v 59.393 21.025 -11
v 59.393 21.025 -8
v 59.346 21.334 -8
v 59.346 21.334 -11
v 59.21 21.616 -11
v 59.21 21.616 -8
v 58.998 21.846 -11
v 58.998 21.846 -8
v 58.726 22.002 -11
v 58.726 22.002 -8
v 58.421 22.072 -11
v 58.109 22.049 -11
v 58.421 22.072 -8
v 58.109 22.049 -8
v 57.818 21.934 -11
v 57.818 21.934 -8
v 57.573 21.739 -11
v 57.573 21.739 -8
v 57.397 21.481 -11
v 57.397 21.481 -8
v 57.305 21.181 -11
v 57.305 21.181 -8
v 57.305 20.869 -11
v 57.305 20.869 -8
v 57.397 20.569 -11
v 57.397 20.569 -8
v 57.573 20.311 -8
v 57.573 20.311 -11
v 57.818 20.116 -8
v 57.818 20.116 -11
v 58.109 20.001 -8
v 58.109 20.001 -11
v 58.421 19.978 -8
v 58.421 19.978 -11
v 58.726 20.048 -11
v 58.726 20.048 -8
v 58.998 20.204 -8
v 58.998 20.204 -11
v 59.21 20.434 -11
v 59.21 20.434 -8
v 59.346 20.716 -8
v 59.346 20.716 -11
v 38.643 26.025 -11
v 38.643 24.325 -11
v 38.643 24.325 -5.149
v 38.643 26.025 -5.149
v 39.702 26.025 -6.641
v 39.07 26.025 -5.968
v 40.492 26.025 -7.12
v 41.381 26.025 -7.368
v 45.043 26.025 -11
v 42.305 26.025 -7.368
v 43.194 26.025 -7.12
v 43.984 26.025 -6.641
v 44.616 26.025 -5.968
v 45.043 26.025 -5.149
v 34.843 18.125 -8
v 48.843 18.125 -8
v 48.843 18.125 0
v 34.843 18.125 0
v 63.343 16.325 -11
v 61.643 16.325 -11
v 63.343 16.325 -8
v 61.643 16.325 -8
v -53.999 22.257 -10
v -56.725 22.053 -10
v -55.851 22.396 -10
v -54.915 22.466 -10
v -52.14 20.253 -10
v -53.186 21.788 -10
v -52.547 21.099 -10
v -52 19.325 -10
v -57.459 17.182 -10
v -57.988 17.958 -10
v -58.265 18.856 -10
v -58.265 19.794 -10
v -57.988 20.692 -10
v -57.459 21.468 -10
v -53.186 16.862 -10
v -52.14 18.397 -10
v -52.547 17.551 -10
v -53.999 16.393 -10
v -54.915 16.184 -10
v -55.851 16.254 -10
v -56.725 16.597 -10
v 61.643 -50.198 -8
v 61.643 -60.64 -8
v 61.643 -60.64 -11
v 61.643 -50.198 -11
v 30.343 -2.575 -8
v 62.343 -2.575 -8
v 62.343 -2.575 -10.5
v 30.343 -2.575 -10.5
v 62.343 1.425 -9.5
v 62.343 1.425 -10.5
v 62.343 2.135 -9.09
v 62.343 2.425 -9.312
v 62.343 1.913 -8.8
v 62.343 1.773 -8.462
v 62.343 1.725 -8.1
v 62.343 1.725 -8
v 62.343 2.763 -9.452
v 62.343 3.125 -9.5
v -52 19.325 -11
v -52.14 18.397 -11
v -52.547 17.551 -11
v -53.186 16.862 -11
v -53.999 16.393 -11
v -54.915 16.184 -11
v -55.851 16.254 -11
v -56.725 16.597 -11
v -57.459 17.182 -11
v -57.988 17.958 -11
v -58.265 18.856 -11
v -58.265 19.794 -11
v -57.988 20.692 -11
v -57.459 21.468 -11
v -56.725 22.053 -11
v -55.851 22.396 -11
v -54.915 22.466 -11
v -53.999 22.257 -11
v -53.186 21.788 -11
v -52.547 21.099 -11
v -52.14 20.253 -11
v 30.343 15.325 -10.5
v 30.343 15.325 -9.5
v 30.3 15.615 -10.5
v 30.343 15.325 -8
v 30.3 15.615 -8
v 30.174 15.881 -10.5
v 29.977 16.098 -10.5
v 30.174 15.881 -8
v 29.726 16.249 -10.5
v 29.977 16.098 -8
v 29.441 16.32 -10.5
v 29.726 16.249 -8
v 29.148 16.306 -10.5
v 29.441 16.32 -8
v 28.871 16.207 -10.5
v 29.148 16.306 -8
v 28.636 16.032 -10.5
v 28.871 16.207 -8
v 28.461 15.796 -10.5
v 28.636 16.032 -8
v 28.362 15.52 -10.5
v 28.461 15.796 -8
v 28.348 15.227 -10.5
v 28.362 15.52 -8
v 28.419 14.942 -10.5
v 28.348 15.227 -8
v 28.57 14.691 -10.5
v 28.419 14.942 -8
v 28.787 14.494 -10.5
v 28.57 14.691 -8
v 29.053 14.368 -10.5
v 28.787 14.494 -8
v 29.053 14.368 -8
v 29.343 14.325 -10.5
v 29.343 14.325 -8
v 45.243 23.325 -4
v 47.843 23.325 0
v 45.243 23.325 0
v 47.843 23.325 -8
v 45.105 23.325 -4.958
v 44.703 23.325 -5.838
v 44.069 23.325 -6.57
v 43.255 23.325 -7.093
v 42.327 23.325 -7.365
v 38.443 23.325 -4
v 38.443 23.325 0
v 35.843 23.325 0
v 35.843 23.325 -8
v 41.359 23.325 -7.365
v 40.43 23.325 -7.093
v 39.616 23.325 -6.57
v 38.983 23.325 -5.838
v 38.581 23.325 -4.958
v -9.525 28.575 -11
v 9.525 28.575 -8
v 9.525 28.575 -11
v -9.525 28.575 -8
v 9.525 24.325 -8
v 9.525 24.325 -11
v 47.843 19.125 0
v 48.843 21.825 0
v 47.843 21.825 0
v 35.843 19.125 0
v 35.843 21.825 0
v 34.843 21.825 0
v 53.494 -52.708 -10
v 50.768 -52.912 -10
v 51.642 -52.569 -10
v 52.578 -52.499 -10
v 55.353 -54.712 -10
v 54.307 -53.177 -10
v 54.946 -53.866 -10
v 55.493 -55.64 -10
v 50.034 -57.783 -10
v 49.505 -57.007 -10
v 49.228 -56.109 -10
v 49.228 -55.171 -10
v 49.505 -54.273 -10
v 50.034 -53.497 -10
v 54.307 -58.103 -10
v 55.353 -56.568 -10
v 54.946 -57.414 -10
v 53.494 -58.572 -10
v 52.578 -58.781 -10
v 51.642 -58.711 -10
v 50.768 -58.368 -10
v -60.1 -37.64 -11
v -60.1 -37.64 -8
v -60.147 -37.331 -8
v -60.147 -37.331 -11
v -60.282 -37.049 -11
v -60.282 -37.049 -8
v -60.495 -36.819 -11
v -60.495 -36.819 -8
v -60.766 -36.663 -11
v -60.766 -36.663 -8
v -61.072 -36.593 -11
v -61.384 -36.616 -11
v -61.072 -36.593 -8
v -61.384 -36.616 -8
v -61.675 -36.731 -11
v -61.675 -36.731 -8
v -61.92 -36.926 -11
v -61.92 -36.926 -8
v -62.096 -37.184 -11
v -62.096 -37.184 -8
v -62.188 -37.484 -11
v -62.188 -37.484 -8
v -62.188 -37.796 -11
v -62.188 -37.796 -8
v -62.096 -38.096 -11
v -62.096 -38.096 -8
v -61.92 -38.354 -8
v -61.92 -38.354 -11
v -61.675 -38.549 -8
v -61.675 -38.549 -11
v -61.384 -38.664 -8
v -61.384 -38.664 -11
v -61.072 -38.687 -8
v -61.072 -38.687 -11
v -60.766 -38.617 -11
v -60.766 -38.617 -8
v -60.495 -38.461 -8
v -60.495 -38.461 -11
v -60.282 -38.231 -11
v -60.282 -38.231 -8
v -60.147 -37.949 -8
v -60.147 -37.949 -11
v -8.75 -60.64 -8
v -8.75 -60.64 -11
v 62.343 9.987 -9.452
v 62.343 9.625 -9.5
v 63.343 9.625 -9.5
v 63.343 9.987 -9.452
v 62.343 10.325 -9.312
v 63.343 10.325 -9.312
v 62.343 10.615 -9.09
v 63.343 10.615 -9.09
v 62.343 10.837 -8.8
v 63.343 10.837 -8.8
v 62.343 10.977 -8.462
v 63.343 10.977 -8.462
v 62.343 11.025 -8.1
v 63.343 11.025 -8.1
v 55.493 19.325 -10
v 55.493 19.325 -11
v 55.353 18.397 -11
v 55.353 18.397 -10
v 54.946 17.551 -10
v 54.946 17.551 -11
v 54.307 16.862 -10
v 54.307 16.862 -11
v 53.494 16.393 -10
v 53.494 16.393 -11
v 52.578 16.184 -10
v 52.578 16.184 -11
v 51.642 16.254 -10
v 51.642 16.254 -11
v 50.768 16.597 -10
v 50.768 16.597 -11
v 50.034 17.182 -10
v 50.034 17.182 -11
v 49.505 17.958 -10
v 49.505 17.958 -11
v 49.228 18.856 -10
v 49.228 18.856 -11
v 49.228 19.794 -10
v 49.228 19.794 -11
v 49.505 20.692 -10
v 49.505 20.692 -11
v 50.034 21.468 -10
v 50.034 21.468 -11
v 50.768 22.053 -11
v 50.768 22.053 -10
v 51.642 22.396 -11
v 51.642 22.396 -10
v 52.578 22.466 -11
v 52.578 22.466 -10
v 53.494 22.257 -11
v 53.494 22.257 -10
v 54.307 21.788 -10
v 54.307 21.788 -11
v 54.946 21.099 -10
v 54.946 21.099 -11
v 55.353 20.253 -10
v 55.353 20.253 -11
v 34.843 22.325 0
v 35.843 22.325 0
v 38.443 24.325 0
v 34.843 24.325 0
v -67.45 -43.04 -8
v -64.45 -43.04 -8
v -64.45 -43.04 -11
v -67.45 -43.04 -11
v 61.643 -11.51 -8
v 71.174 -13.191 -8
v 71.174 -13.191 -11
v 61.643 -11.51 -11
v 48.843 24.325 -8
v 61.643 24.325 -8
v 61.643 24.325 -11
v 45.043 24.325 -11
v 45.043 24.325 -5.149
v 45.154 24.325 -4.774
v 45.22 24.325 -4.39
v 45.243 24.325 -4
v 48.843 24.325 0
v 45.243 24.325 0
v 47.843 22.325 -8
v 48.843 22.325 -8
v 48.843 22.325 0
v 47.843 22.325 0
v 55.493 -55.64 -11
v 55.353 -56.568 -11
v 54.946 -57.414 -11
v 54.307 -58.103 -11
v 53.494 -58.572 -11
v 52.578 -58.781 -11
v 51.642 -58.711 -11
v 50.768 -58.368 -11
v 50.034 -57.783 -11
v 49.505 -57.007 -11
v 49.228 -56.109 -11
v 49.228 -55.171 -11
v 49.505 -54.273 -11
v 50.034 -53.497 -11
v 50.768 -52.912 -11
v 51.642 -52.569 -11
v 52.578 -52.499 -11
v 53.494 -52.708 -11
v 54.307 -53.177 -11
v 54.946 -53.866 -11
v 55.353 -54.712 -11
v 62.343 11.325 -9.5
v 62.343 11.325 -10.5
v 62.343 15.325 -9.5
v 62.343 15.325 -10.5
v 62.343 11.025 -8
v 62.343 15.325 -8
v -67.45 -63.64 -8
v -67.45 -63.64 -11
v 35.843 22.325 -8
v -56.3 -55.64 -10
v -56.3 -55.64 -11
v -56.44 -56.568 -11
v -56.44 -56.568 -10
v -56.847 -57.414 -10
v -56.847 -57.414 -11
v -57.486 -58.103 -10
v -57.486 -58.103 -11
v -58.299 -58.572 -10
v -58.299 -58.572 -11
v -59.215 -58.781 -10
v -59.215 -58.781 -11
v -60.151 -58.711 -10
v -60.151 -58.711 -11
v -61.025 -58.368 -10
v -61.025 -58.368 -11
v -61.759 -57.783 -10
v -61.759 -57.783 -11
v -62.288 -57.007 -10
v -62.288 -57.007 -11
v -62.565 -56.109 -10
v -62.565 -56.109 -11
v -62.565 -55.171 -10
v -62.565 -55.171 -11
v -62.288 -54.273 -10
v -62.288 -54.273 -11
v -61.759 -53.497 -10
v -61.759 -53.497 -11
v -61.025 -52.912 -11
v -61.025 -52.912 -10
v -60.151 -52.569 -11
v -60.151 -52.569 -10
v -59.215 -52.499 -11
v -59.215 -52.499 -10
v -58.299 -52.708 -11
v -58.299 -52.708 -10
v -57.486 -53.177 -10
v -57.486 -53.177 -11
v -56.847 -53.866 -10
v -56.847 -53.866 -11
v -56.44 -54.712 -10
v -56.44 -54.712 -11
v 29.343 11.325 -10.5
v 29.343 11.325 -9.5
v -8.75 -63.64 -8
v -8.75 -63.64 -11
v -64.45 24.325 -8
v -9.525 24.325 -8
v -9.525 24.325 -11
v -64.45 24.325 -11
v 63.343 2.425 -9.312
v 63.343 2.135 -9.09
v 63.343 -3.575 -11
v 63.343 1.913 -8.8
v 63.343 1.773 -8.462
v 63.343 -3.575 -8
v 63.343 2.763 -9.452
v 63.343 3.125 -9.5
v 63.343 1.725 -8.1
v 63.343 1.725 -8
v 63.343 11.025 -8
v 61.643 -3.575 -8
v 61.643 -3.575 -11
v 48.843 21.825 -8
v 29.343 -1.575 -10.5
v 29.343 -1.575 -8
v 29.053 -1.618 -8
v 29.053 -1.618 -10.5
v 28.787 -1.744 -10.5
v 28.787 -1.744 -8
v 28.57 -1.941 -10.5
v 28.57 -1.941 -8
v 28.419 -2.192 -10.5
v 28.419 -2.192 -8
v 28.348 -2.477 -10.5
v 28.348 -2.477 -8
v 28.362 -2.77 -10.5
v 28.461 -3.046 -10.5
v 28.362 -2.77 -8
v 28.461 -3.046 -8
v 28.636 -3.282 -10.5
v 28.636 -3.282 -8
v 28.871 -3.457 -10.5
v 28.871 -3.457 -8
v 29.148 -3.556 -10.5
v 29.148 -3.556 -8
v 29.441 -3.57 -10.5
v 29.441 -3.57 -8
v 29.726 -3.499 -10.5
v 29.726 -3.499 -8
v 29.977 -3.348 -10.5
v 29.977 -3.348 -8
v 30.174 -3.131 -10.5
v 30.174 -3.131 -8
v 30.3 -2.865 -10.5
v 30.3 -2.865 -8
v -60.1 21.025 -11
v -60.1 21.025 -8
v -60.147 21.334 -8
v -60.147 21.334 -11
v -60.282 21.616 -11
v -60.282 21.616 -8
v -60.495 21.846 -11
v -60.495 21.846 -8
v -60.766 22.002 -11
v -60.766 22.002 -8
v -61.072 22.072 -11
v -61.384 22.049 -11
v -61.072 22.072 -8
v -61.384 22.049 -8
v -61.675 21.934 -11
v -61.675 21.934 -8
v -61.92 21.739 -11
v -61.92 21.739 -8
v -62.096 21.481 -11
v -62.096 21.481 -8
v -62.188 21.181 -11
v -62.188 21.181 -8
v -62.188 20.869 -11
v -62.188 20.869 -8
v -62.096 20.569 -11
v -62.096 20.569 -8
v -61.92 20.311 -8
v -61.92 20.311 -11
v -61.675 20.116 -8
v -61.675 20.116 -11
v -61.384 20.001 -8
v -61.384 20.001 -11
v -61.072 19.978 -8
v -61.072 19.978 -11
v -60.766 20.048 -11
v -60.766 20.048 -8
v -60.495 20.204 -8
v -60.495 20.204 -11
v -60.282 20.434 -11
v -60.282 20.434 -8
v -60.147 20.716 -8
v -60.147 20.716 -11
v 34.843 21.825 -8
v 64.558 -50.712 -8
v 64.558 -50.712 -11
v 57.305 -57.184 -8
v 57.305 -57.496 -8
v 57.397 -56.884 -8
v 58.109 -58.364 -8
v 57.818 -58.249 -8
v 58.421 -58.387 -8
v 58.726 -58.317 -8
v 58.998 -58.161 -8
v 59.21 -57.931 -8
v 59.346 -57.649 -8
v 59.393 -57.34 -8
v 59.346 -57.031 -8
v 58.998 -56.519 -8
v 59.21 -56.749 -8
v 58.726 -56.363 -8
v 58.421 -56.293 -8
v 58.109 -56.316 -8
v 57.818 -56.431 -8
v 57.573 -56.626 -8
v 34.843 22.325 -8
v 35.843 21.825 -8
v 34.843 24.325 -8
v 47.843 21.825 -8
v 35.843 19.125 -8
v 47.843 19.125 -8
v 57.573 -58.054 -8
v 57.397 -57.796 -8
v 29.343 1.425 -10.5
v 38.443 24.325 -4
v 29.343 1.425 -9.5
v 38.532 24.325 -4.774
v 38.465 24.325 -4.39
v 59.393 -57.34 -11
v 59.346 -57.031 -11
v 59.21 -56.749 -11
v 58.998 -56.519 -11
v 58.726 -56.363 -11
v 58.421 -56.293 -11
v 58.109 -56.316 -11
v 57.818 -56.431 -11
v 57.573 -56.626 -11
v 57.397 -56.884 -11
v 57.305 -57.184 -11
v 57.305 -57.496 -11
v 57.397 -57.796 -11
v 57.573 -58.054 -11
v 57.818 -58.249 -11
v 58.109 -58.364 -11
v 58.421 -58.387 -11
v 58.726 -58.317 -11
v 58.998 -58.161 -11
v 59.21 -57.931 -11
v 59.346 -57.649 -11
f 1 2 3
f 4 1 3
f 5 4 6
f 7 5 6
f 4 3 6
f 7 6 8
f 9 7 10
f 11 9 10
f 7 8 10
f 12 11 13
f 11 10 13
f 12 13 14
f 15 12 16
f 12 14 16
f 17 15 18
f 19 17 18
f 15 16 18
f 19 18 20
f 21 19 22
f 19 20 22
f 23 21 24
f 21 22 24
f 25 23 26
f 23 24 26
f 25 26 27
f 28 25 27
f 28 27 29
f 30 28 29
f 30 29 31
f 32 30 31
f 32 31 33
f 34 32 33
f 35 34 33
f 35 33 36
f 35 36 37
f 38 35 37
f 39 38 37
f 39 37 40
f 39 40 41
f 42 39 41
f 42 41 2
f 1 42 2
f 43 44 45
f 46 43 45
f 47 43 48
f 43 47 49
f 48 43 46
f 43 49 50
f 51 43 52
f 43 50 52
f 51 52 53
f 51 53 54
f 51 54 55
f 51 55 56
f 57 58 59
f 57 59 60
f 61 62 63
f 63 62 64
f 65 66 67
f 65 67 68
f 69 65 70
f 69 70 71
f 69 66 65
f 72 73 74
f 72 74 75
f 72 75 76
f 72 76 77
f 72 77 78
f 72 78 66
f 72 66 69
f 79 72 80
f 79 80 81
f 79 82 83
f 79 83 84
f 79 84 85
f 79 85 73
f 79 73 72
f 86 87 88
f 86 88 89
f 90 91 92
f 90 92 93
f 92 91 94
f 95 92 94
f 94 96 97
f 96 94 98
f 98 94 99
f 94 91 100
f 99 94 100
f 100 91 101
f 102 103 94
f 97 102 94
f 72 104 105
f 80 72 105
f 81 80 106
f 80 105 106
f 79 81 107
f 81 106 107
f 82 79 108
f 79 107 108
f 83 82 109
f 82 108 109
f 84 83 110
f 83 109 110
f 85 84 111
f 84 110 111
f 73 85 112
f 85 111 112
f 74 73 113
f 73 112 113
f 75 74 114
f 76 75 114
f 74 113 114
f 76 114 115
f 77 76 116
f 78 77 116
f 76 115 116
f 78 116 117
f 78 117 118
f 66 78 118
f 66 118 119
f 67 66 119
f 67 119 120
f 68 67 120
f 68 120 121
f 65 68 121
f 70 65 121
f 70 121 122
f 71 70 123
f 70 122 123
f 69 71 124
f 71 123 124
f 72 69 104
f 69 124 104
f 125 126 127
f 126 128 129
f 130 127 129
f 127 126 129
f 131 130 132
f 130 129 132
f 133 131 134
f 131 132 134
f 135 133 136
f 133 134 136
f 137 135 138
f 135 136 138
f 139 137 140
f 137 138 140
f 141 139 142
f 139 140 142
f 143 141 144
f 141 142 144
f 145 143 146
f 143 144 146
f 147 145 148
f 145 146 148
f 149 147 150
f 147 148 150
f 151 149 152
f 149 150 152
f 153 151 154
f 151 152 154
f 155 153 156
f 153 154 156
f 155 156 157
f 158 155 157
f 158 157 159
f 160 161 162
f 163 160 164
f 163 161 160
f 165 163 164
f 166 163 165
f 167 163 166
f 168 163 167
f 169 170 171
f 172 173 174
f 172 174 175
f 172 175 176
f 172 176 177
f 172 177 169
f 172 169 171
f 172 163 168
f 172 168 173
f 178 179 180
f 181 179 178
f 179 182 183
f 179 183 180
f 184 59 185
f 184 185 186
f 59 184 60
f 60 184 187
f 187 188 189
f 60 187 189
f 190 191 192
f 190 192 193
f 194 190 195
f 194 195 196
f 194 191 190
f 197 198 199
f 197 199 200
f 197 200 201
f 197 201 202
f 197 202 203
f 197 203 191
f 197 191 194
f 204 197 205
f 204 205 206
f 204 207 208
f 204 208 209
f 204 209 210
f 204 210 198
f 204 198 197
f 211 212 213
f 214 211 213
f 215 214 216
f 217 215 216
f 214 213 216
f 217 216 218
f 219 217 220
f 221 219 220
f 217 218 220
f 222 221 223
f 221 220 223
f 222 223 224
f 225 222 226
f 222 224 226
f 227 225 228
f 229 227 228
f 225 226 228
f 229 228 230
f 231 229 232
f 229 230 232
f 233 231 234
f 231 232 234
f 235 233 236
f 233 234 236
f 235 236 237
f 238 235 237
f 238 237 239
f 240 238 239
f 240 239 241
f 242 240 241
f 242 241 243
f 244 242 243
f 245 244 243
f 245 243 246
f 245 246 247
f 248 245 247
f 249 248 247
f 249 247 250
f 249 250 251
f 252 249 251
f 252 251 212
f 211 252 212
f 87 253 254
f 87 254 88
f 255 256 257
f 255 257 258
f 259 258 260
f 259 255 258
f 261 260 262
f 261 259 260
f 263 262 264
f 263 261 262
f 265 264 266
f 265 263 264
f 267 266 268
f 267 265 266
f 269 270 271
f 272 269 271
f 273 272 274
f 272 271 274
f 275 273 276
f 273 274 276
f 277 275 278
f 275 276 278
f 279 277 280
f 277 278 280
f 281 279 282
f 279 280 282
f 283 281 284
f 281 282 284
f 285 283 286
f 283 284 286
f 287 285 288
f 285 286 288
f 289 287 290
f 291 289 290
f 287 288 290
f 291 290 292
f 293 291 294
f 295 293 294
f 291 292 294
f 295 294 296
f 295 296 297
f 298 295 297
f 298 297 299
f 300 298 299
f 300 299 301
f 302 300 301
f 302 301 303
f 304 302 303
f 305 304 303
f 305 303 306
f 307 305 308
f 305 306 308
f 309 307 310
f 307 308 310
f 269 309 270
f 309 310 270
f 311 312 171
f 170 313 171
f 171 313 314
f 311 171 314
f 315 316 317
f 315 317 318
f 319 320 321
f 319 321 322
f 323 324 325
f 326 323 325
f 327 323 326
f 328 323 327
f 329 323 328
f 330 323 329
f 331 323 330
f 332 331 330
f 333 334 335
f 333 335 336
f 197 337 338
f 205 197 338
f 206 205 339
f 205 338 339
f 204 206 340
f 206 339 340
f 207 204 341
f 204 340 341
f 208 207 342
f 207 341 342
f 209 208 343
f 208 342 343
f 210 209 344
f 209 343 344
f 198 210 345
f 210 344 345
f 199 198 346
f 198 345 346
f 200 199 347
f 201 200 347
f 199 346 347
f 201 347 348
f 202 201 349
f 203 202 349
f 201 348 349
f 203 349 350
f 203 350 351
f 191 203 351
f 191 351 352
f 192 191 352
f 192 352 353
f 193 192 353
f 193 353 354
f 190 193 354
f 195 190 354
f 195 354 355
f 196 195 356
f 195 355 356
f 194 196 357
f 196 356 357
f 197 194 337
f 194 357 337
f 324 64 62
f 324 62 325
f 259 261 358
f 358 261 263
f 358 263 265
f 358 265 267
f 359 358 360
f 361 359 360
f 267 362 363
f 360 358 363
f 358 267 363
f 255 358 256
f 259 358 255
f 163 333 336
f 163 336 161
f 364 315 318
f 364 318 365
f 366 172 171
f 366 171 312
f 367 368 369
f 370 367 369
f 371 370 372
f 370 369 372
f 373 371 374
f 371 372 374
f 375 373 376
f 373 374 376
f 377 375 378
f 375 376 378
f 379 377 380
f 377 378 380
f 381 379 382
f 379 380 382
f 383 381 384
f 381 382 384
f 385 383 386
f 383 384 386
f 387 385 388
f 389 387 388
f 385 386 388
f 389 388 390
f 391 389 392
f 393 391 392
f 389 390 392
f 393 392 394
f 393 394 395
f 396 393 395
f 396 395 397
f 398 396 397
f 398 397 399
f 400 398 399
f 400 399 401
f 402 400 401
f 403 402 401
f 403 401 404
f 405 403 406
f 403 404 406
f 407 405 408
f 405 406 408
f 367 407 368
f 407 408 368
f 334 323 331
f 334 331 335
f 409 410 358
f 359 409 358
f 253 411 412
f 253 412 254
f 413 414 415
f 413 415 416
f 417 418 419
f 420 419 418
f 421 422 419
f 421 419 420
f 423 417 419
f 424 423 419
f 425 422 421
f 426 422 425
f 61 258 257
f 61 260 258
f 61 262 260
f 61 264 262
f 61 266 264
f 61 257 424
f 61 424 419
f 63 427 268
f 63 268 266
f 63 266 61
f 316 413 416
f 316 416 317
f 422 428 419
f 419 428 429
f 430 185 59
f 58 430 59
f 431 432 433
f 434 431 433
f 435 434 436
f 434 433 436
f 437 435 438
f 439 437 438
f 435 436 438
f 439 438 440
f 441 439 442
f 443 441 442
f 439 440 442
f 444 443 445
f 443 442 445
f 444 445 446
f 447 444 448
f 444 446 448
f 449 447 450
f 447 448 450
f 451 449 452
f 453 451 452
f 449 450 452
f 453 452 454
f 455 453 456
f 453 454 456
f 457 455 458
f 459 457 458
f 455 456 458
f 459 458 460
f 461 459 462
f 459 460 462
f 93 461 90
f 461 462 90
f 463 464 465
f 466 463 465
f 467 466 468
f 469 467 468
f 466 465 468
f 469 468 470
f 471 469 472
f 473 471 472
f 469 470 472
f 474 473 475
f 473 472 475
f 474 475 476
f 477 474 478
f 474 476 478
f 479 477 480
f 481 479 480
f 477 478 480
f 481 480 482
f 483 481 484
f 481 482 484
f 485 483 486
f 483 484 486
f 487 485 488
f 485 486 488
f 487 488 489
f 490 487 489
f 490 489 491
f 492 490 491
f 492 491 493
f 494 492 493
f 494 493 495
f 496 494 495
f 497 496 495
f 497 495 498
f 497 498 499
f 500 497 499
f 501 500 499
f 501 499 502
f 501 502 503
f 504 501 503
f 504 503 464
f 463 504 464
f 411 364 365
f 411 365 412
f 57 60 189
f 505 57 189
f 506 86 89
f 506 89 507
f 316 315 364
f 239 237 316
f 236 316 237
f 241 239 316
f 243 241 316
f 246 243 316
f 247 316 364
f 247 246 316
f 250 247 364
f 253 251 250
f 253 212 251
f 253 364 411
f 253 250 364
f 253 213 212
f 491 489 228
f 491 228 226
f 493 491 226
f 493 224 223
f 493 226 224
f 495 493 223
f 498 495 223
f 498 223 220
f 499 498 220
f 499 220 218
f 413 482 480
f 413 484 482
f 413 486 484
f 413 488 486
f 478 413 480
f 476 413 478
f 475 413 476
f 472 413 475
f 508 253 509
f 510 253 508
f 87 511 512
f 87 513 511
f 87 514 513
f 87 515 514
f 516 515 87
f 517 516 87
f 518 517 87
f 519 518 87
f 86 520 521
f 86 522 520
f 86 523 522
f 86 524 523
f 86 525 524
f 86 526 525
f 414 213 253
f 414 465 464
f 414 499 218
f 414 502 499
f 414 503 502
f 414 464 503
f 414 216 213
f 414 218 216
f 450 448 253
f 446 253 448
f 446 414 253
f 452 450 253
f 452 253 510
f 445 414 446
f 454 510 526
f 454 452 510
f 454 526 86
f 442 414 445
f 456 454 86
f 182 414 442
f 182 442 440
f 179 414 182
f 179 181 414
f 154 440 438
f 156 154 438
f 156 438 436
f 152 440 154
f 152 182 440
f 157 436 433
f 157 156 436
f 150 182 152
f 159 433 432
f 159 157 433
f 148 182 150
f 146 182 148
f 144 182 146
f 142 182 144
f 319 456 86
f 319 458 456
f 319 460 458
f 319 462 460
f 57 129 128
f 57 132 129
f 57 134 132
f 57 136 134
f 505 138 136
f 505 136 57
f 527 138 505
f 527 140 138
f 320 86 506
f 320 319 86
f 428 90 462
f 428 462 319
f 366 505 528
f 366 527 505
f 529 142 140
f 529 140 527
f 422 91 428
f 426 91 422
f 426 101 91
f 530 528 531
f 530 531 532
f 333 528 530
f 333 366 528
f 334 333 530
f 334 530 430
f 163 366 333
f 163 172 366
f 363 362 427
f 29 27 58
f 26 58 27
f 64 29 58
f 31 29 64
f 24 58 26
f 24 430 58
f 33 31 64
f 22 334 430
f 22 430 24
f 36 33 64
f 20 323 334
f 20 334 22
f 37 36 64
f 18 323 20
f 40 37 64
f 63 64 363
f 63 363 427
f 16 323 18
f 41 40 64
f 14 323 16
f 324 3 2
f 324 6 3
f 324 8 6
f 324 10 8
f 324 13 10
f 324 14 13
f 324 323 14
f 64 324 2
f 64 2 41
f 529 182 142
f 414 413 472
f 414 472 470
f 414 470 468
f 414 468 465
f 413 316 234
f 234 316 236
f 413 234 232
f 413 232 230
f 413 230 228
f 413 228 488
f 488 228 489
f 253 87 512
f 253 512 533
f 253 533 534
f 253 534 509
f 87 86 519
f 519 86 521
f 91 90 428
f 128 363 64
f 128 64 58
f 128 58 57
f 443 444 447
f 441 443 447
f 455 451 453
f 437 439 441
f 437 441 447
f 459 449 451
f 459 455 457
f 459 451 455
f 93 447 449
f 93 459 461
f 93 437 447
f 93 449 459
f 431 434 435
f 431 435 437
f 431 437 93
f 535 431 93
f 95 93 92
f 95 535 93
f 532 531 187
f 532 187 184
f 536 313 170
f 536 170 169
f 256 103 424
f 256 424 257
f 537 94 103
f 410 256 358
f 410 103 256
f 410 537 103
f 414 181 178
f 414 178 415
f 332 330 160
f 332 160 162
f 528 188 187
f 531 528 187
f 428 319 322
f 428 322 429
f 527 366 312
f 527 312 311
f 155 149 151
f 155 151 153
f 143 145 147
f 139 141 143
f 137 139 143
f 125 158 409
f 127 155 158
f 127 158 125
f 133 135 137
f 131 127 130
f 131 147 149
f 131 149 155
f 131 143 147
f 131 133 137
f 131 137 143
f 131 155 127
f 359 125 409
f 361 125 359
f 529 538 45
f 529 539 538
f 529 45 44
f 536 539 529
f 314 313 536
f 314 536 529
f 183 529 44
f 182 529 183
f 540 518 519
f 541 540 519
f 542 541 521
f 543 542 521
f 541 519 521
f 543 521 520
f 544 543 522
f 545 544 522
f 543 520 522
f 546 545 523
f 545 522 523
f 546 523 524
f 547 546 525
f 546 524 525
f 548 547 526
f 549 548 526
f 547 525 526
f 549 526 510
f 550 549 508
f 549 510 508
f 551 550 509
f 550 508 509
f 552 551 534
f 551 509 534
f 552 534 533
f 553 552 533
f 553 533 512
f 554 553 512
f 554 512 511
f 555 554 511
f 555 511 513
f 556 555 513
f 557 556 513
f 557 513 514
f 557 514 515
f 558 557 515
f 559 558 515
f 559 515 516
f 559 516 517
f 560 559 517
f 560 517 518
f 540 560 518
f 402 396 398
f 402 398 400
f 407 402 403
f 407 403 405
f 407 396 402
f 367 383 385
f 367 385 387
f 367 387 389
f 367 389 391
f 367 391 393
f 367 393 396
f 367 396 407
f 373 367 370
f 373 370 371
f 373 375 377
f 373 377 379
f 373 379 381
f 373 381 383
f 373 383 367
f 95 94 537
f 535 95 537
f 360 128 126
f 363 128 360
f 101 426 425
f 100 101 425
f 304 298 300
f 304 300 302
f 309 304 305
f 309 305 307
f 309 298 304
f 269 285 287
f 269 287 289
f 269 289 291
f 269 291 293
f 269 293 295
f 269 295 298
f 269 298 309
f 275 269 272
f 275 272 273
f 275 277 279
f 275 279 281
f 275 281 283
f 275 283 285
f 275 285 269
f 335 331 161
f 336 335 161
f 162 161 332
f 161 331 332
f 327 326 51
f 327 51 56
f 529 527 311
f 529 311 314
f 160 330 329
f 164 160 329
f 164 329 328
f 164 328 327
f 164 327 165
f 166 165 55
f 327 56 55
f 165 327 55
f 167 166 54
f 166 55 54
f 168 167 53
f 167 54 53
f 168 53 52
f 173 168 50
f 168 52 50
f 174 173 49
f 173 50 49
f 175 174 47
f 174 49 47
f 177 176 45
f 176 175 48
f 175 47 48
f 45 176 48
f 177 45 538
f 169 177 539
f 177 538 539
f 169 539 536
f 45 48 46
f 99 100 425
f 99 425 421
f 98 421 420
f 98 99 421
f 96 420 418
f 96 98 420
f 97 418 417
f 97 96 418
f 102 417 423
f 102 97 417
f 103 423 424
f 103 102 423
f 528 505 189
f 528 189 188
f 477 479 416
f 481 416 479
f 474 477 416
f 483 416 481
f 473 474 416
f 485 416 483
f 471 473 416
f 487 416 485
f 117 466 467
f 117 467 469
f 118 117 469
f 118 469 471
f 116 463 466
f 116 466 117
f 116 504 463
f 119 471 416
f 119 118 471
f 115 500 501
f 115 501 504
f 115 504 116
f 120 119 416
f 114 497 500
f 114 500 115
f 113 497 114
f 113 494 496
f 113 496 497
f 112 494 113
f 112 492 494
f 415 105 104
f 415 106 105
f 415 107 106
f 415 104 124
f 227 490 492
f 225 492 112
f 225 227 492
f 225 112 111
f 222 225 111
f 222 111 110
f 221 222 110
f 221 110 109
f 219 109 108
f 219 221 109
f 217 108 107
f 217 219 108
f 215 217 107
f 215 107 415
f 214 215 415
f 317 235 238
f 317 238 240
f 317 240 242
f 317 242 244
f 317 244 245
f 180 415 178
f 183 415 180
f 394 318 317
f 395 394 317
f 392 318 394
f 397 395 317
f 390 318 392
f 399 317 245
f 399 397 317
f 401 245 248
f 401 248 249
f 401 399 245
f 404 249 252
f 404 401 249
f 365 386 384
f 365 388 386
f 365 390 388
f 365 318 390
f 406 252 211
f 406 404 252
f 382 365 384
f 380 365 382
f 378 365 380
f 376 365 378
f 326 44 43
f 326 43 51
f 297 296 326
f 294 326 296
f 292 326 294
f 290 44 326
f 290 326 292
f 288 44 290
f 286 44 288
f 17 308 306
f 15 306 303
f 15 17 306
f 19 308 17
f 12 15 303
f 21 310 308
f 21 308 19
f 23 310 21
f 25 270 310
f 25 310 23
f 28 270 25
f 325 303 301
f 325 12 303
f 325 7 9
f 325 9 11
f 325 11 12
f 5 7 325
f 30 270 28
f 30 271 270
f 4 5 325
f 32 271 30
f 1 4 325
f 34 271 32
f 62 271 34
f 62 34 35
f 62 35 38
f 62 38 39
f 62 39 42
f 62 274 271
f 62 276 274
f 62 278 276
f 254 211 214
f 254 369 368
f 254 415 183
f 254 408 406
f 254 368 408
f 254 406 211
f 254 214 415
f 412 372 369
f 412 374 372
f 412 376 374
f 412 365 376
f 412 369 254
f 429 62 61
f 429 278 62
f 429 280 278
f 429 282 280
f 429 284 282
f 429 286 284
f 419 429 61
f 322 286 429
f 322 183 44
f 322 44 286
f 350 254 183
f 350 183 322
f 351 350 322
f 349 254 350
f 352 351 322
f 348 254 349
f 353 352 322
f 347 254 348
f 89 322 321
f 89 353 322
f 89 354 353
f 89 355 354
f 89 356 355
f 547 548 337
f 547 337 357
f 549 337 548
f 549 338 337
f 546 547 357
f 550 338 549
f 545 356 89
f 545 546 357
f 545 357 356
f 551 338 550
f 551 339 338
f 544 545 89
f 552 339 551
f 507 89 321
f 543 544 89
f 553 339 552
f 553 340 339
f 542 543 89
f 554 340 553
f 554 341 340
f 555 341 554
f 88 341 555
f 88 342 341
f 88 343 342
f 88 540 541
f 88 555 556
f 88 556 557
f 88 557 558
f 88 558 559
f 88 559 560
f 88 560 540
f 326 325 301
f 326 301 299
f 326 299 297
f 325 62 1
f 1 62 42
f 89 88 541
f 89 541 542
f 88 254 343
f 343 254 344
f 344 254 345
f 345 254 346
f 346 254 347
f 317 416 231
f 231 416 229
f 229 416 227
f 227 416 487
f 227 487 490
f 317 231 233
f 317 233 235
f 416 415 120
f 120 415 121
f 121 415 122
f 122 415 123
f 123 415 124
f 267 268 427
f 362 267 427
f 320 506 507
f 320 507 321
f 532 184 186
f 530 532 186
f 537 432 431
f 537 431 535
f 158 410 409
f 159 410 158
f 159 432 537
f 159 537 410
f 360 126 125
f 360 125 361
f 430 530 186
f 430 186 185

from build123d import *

# Parameters (mm, degrees)
PAD017_DEPTH    = 3
SKETCH041_R     = 1.05
POCKET007_DEPTH = 3.001
PAD018_DEPTH    = 1.7
SKETCH043_W     = 33
SKETCH043_H     = 17.9
POCKET008_DEPTH = 1.5
POCKET009_DEPTH = 2.5
SKETCH045_W     = 6.4
SKETCH045_H     = 7
PAD019_DEPTH    = 1.7
PAD020_DEPTH    = 8
POCKET010_DEPTH = 6.9
SKETCH048_R     = 3.15
POCKET011_DEPTH = 1


with BuildPart() as part:
    # Sketch040 (on Face97 of Binder002) → Pad017 (new body)
    with BuildSketch(Plane.XY.offset(-8)):
        Polygon((-64.45, 24.325), (-64.45, -43.04), (-67.45, -43.04), (-67.45, -63.64), (-8.75, -63.64), (-8.75, -60.64), (61.6428917544, -60.64), (61.6428917544, -50.1977285884), (64.5583406887, -50.7118008964), (71.1743362578, -13.1906255066), (61.6428917544, -11.5099746756), (61.6428917544, 24.325), (9.525, 24.325), (9.525, 28.575), (-9.525, 28.575), (-9.525, 24.325), align=None)
    extrude(amount=-PAD017_DEPTH)

    # Sketch041 (on Face17 of Pad017) → Pocket007 (cut, through all)
    with BuildSketch(Plane.XY.offset(-8)):
        with Locations((-61.15, 21.025)):
            Circle(SKETCH041_R)
        with Locations((-61.15, -37.64)):
            Circle(SKETCH041_R)
        with Locations((58.3428917544, 21.025)):
            Circle(SKETCH041_R)
        with Locations((58.3428917544, -57.34)):
            Circle(SKETCH041_R)
    extrude(amount=-POCKET007_DEPTH, mode=Mode.SUBTRACT)

    # Sketch042 (on Vertex202 of Binder002) → Pad018 (join)
    with BuildSketch(Plane(origin=(61.6428917544, 16.525, -11), x_dir=(0, 1, 0), z_dir=(1, 0, 0))):
        with BuildLine():
            Line((-0.2, 0), (-0.2, 3))
            Line((-0.2, 3), (-5.5, 3))
            Line((-5.5, 2.9), (-5.5, 3))
            ThreePointArc((-6.9, 1.5), (-5.9100505063, 1.9100505063), (-5.5, 2.9))
            Line((-13.4, 1.5), (-6.9, 1.5))
            ThreePointArc((-14.8, 2.9), (-14.3899494937, 1.9100505063), (-13.4, 1.5))
            Line((-14.8, 3), (-14.8, 2.9))
            Line((-20.1, 3), (-14.8, 3))
            Line((-20.1, 3), (-20.1, 0))
            Line((-20.1, 0), (-0.2, 0))
        make_face()
    extrude(amount=PAD018_DEPTH)

    # Sketch043 (on Vertex40 of Pad018) → Pocket008 (cut)
    with BuildSketch(Plane(origin=(63.3428917544, 16.325, -8), x_dir=(1, 0, 0), z_dir=(0, 0, 1))):
        with Locations((-17.5, -9.95)):
            Rectangle(SKETCH043_W, SKETCH043_H)
    extrude(amount=-POCKET008_DEPTH, mode=Mode.SUBTRACT)

    # Sketch044 (on Face4 of Pocket008) → Pocket009 (cut)
    with BuildSketch(Plane.XY.offset(-8)):
        with BuildLine():
            ThreePointArc((30.3428917544, 15.3249996463), (28.6357850983, 16.0321069062), (29.3428917544, 14.325))
            Line((29.3428917544, 14.325), (29.3428917544, 11.3249996463))
            Line((29.3428917544, 11.3249996463), (62.3428917544, 11.3249996463))
            Line((62.3428917544, 11.3249996463), (62.3428917544, 15.3249996463))
            Line((30.3428917544, 15.3249996463), (62.3428917544, 15.3249996463))
        make_face()
        with BuildLine():
            ThreePointArc((29.3428917544, -1.575), (28.6357848482, -3.2821066561), (30.3428917544, -2.5750003537))
            Line((62.3428917544, -2.5750003537), (30.3428917544, -2.5750003537))
            Line((62.3428917544, -2.5750003537), (62.3428917544, 1.4249996463))
            Line((62.3428917544, 1.4249996463), (29.3428917544, 1.4249996463))
            Line((29.3428917544, 1.4249996463), (29.3428917544, -1.575))
        make_face()
    extrude(amount=-POCKET009_DEPTH, mode=Mode.SUBTRACT)

    # Sketch045 (on Vertex102 of Binder002) → Pad019 (join)
    with BuildSketch(Plane(origin=(38.4428917544, 24.325, -11), x_dir=(1, 0, 0), z_dir=(0, -1, 0))):
        with Locations((3.4, 3.5)):
            Rectangle(SKETCH045_W, SKETCH045_H)
    extrude(amount=-PAD019_DEPTH)

    # Sketch046 (on Vertex13 of Pad019) → Pad020 (join)
    with BuildSketch(Plane(origin=(45.0428917544, 24.325, -8), x_dir=(1, 0, 0), z_dir=(0, 0, 1))):
        Polygon((-9.2, -1), (-9.2, -2), (-10.2, -2), (-10.2, 0), (3.8, 0), (3.8, -2), (2.8, -2), (2.8, -1), align=None)
        Polygon((-10.2, -2.5), (-9.2, -2.5), (-9.2, -5.2), (2.8, -5.2), (2.8, -2.5), (3.8, -2.5), (3.8, -6.2), (-10.2, -6.2), align=None)
    extrude(amount=PAD020_DEPTH)

    # Sketch047 (on Face51 of Pad020) → Pocket010 (cut)
    with BuildSketch(Plane(origin=(0, 26.025, 0), x_dir=(-1, 0, 0), z_dir=(0, 1, 0))):
        with BuildLine():
            ThreePointArc((-45.2428917544, -4), (-41.8428917544, -7.4), (-38.4428917544, -4))
            Line((-38.4428917544, 0), (-38.4428917544, -4))
            Line((-45.2428917544, 0), (-38.4428917544, 0))
            Line((-45.2428917544, -4), (-45.2428917544, 0))
        make_face()
    extrude(amount=-POCKET010_DEPTH, mode=Mode.SUBTRACT)

    # Sketch048 (on Face5 of Pocket010) → Pocket011 (cut)
    with BuildSketch(Plane(origin=(0, 0, -11), x_dir=(1, 0, 0), z_dir=(0, 0, -1))):
        with Locations((-59.45, 55.64)):
            Circle(SKETCH048_R)
        with Locations((52.3428917545, 55.64)):
            Circle(SKETCH048_R)
        with Locations((-55.15, -19.325)):
            Circle(SKETCH048_R)
        with Locations((52.3428917545, -19.325)):
            Circle(SKETCH048_R)
    extrude(amount=-POCKET011_DEPTH, mode=Mode.SUBTRACT)


solid = part.part
